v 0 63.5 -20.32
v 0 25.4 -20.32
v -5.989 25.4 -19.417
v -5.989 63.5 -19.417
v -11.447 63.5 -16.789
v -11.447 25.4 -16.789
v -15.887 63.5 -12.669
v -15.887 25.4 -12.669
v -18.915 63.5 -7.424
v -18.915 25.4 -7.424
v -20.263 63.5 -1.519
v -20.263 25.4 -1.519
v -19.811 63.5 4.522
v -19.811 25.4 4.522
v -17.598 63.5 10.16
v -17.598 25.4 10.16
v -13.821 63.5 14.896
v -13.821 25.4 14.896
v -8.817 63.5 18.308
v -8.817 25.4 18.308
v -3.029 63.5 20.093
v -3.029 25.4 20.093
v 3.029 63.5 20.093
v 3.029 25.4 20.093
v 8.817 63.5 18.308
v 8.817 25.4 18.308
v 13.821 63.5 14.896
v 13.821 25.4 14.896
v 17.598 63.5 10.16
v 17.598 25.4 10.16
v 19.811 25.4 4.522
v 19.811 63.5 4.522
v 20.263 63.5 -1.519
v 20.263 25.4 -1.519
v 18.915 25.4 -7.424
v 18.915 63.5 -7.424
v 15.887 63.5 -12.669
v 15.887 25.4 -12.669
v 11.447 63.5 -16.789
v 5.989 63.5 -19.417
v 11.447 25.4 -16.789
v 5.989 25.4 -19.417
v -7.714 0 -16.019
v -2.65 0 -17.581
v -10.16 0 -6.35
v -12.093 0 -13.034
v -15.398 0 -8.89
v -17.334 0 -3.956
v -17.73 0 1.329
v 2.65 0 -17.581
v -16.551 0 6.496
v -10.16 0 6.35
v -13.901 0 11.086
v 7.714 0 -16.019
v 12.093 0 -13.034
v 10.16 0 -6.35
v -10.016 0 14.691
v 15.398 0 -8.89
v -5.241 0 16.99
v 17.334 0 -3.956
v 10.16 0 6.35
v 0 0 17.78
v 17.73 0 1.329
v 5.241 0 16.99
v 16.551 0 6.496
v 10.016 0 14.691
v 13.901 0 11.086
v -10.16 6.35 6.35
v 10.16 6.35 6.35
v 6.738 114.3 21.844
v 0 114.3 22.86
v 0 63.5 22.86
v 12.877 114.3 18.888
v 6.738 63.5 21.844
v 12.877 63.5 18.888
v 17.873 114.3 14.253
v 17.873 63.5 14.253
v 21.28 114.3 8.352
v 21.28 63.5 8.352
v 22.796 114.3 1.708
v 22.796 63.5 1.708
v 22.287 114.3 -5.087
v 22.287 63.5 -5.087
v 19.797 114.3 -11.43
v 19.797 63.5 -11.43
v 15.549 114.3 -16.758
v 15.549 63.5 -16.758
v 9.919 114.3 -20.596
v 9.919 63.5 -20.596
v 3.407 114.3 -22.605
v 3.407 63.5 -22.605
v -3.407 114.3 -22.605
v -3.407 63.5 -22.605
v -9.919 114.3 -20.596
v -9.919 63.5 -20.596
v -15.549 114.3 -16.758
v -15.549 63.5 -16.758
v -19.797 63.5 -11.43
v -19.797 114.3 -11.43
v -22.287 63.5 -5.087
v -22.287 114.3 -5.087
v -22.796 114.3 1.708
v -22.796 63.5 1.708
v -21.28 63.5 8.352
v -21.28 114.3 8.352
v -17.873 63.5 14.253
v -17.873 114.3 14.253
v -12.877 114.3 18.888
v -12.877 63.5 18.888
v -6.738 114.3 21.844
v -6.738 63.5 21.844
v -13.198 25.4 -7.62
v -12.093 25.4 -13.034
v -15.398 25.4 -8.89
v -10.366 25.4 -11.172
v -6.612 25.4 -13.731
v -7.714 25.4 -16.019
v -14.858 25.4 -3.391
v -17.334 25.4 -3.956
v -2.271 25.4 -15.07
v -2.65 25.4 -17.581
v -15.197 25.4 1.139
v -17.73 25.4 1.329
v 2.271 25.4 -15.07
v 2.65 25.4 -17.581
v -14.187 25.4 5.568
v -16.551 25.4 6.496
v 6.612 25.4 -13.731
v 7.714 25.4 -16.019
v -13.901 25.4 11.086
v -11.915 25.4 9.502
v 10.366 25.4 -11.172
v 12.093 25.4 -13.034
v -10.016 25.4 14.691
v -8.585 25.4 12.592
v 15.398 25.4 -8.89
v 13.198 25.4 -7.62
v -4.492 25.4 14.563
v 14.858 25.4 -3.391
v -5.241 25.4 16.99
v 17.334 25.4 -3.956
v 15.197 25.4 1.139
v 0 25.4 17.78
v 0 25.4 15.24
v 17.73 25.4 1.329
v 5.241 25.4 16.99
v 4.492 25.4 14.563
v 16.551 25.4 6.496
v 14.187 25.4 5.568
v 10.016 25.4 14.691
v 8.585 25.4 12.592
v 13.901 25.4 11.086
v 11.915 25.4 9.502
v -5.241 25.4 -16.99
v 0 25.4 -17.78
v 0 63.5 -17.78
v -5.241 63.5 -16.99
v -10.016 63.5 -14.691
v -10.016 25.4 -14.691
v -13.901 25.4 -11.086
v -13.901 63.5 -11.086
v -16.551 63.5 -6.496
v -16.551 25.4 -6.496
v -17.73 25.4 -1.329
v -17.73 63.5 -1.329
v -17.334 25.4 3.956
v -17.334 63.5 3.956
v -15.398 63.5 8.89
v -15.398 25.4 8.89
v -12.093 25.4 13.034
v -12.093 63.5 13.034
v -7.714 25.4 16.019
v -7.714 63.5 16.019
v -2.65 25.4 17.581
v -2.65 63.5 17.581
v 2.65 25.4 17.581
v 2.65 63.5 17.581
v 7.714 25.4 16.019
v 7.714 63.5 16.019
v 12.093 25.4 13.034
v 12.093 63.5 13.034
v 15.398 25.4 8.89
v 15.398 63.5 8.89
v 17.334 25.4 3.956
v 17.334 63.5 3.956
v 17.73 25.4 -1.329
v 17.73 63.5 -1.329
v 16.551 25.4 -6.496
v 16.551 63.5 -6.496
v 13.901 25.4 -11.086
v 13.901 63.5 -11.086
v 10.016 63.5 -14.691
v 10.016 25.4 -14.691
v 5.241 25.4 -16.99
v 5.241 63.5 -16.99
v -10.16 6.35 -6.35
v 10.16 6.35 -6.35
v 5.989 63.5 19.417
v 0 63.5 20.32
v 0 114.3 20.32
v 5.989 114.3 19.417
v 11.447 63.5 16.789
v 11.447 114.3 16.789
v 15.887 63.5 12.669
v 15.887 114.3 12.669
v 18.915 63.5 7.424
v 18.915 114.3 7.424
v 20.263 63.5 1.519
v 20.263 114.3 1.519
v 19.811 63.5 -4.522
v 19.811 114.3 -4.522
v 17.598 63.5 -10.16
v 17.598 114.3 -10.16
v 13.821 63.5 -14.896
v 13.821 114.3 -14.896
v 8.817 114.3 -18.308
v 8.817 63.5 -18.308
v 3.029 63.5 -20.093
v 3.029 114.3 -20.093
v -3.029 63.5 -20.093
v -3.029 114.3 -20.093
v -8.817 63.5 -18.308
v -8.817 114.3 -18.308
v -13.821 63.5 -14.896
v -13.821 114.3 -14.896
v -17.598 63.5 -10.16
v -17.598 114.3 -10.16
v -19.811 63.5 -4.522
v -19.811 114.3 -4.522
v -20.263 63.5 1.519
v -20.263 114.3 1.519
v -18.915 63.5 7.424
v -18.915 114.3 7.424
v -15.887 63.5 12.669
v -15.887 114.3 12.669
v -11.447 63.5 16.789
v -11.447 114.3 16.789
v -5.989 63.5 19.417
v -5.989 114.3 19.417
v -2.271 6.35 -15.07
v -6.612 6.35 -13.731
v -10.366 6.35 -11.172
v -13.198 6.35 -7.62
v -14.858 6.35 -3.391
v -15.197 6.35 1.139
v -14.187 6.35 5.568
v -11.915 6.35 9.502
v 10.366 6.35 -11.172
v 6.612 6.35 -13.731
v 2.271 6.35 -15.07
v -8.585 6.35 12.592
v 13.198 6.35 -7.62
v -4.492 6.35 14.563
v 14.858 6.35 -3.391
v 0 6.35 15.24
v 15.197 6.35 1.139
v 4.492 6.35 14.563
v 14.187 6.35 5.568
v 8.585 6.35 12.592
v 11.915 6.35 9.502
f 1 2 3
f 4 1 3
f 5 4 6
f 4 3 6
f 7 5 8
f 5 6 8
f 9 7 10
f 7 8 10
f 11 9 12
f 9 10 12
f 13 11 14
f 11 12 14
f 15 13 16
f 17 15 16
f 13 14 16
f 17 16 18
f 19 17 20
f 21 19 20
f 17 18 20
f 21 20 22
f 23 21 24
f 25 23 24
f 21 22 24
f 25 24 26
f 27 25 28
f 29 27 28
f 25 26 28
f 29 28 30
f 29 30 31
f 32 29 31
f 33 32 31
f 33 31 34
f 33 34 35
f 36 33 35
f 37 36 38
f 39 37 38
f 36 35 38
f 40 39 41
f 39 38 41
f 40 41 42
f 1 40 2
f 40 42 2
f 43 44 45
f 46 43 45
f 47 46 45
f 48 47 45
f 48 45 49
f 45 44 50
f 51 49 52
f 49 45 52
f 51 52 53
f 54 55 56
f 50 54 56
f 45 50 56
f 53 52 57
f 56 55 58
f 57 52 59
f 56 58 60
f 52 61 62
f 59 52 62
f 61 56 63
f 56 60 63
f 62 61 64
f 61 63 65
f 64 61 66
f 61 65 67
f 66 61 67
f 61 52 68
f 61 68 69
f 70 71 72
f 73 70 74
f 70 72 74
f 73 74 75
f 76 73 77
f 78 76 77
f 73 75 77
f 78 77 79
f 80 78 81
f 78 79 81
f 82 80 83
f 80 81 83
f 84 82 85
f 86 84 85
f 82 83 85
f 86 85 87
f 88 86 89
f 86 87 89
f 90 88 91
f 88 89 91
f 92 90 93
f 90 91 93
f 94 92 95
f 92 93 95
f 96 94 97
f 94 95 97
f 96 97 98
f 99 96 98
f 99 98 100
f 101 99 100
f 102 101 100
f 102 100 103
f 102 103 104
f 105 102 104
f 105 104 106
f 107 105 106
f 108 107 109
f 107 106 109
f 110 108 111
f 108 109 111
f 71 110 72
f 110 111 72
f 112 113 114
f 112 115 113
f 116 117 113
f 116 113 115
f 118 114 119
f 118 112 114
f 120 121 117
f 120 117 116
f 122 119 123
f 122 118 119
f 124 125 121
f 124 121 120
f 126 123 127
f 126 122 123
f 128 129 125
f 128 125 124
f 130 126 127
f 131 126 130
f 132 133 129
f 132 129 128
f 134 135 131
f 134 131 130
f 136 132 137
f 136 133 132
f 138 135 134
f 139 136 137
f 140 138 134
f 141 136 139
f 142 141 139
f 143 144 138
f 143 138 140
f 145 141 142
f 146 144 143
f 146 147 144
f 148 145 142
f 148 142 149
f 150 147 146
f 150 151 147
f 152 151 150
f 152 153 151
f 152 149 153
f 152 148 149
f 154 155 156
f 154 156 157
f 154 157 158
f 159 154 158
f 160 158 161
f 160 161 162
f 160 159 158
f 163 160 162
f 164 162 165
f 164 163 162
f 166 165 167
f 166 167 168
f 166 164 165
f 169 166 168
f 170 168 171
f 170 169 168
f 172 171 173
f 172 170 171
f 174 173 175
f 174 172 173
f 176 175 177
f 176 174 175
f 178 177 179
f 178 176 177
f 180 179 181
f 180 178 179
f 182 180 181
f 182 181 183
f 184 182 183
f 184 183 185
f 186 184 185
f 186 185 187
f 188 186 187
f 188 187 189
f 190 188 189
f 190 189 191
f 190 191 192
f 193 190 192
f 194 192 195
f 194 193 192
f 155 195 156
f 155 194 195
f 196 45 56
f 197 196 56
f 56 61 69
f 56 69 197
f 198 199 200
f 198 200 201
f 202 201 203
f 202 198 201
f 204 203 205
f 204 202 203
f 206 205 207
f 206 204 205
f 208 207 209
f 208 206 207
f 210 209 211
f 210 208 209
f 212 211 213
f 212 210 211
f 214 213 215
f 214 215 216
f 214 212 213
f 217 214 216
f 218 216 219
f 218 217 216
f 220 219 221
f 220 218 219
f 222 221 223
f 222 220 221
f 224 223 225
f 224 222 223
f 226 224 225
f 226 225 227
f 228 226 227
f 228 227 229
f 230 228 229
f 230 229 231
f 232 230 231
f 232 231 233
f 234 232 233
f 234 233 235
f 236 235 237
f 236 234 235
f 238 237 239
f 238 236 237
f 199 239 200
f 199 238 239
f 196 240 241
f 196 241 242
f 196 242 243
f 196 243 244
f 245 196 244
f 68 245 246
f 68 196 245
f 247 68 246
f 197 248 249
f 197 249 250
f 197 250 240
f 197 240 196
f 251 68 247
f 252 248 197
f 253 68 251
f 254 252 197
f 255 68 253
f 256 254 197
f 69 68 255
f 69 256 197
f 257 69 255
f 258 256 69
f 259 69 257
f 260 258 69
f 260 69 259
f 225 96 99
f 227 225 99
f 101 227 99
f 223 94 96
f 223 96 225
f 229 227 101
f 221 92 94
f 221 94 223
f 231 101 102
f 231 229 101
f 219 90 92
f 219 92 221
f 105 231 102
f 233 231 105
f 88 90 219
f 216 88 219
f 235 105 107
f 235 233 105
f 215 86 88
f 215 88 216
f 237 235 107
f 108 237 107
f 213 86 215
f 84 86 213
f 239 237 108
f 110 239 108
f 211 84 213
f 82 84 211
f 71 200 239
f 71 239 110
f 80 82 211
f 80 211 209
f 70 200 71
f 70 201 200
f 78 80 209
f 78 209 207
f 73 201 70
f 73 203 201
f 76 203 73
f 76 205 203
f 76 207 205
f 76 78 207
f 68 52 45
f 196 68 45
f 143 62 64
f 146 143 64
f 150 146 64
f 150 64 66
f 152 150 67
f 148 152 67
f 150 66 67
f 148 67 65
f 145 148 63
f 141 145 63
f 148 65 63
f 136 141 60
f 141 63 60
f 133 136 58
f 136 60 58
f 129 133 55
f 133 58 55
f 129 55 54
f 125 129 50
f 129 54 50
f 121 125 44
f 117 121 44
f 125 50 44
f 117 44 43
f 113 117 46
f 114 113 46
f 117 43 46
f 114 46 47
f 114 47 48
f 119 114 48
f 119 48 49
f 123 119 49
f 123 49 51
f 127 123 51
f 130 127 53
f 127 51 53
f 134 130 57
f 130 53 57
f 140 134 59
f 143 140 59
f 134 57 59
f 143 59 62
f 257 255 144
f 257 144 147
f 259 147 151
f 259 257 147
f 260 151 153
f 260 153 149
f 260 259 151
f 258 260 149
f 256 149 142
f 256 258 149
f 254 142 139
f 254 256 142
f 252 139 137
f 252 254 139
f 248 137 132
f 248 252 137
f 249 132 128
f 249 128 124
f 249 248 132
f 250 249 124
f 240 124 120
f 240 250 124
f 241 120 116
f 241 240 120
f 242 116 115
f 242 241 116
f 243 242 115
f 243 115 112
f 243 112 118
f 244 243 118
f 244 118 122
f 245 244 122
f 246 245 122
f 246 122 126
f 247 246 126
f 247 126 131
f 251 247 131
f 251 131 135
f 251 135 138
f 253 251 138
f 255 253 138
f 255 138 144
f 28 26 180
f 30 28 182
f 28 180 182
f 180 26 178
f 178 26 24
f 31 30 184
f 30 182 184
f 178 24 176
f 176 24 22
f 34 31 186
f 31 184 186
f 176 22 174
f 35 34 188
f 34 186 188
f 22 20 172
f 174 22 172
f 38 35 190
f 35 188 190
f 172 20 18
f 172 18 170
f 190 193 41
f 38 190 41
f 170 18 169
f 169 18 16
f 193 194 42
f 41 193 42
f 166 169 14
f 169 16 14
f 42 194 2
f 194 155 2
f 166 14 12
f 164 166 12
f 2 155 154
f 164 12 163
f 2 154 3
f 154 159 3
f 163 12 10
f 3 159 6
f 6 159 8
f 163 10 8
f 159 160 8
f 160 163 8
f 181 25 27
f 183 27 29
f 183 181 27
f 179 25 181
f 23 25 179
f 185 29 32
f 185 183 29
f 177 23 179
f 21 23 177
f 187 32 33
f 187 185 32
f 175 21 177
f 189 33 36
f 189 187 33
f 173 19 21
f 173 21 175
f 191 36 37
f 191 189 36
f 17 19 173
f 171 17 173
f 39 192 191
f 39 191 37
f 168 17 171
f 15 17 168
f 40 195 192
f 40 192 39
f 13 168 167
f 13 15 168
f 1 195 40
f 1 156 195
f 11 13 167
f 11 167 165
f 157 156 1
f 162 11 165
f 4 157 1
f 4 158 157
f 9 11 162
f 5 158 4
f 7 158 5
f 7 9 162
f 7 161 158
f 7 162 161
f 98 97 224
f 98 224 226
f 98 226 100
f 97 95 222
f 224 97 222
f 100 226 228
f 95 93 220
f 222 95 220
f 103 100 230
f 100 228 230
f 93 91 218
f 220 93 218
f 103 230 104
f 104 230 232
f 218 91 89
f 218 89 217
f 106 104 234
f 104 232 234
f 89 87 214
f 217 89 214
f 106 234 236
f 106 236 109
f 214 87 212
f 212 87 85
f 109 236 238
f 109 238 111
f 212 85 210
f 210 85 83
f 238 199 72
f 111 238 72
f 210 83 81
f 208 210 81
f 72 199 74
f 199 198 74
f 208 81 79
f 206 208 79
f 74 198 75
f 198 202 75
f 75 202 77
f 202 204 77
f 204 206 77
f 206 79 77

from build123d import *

# Parameters (mm, degrees)
SKETCH1_R           = 15.24
SKETCH1_W           = 20.32
SKETCH1_H           = 12.7
BOSS_EXTRUDE1_DEPTH = 6.35
SKETCH2_R           = 17.78
SKETCH2_R_2         = 15.24
BOSS_EXTRUDE2_DEPTH = 25.4
SKETCH5_R           = 20.32
SKETCH5_R_2         = 17.78
BOSS_EXTRUDE3_DEPTH = 38.1
SKETCH6_R           = 22.86
SKETCH6_R_2         = 20.32
BOSS_EXTRUDE4_DEPTH = 50.8


with BuildPart() as part:
    # Sketch1 → Boss-Extrude1 (new body)
    with BuildSketch(Plane(origin=(0, 0, 0), x_dir=(1, 0, 0), z_dir=(0, 1, 0))):
        with Locations(Location((0, 0, 0), (0, 0, 270))):
            Circle(SKETCH1_R)
        Rectangle(SKETCH1_W, SKETCH1_H, mode=Mode.SUBTRACT)
    extrude(amount=BOSS_EXTRUDE1_DEPTH)

    # Sketch2 → Boss-Extrude2 (add)
    with BuildSketch(Plane(origin=(0, 0, 0), x_dir=(1, 0, 0), z_dir=(0, 1, 0))):
        with Locations(Location((0, 0, 0), (0, 0, 270))):
            Circle(SKETCH2_R)
        with Locations(Location((0, 0, 0), (0, 0, 270))):
            Circle(SKETCH2_R_2, mode=Mode.SUBTRACT)
    extrude(amount=BOSS_EXTRUDE2_DEPTH)


with BuildPart() as body_2:
    # Sketch5 → Boss-Extrude3 (new body)
    with BuildSketch(Plane(origin=(0, 25.4, 0), x_dir=(1, 0, 0), z_dir=(0, 1, 0))):
        with Locations(Location((0, 0, 0), (0, 0, 90))):
            Circle(SKETCH5_R)
        with Locations(Location((0, 0, 0), (0, 0, 90))):
            Circle(SKETCH5_R_2, mode=Mode.SUBTRACT)
    extrude(amount=BOSS_EXTRUDE3_DEPTH)


with BuildPart() as body_3:
    # Sketch6 → Boss-Extrude4 (new body)
    with BuildSketch(Plane(origin=(0, 63.5, 0), x_dir=(1, 0, 0), z_dir=(0, 1, 0))):
        with Locations(Location((0, 0, 0), (0, 0, 270))):
            Circle(SKETCH6_R)
        with Locations(Location((0, 0, 0), (0, 0, 270))):
            Circle(SKETCH6_R_2, mode=Mode.SUBTRACT)
    extrude(amount=BOSS_EXTRUDE4_DEPTH)


solid = Compound([part.part, body_2.part, body_3.part])
